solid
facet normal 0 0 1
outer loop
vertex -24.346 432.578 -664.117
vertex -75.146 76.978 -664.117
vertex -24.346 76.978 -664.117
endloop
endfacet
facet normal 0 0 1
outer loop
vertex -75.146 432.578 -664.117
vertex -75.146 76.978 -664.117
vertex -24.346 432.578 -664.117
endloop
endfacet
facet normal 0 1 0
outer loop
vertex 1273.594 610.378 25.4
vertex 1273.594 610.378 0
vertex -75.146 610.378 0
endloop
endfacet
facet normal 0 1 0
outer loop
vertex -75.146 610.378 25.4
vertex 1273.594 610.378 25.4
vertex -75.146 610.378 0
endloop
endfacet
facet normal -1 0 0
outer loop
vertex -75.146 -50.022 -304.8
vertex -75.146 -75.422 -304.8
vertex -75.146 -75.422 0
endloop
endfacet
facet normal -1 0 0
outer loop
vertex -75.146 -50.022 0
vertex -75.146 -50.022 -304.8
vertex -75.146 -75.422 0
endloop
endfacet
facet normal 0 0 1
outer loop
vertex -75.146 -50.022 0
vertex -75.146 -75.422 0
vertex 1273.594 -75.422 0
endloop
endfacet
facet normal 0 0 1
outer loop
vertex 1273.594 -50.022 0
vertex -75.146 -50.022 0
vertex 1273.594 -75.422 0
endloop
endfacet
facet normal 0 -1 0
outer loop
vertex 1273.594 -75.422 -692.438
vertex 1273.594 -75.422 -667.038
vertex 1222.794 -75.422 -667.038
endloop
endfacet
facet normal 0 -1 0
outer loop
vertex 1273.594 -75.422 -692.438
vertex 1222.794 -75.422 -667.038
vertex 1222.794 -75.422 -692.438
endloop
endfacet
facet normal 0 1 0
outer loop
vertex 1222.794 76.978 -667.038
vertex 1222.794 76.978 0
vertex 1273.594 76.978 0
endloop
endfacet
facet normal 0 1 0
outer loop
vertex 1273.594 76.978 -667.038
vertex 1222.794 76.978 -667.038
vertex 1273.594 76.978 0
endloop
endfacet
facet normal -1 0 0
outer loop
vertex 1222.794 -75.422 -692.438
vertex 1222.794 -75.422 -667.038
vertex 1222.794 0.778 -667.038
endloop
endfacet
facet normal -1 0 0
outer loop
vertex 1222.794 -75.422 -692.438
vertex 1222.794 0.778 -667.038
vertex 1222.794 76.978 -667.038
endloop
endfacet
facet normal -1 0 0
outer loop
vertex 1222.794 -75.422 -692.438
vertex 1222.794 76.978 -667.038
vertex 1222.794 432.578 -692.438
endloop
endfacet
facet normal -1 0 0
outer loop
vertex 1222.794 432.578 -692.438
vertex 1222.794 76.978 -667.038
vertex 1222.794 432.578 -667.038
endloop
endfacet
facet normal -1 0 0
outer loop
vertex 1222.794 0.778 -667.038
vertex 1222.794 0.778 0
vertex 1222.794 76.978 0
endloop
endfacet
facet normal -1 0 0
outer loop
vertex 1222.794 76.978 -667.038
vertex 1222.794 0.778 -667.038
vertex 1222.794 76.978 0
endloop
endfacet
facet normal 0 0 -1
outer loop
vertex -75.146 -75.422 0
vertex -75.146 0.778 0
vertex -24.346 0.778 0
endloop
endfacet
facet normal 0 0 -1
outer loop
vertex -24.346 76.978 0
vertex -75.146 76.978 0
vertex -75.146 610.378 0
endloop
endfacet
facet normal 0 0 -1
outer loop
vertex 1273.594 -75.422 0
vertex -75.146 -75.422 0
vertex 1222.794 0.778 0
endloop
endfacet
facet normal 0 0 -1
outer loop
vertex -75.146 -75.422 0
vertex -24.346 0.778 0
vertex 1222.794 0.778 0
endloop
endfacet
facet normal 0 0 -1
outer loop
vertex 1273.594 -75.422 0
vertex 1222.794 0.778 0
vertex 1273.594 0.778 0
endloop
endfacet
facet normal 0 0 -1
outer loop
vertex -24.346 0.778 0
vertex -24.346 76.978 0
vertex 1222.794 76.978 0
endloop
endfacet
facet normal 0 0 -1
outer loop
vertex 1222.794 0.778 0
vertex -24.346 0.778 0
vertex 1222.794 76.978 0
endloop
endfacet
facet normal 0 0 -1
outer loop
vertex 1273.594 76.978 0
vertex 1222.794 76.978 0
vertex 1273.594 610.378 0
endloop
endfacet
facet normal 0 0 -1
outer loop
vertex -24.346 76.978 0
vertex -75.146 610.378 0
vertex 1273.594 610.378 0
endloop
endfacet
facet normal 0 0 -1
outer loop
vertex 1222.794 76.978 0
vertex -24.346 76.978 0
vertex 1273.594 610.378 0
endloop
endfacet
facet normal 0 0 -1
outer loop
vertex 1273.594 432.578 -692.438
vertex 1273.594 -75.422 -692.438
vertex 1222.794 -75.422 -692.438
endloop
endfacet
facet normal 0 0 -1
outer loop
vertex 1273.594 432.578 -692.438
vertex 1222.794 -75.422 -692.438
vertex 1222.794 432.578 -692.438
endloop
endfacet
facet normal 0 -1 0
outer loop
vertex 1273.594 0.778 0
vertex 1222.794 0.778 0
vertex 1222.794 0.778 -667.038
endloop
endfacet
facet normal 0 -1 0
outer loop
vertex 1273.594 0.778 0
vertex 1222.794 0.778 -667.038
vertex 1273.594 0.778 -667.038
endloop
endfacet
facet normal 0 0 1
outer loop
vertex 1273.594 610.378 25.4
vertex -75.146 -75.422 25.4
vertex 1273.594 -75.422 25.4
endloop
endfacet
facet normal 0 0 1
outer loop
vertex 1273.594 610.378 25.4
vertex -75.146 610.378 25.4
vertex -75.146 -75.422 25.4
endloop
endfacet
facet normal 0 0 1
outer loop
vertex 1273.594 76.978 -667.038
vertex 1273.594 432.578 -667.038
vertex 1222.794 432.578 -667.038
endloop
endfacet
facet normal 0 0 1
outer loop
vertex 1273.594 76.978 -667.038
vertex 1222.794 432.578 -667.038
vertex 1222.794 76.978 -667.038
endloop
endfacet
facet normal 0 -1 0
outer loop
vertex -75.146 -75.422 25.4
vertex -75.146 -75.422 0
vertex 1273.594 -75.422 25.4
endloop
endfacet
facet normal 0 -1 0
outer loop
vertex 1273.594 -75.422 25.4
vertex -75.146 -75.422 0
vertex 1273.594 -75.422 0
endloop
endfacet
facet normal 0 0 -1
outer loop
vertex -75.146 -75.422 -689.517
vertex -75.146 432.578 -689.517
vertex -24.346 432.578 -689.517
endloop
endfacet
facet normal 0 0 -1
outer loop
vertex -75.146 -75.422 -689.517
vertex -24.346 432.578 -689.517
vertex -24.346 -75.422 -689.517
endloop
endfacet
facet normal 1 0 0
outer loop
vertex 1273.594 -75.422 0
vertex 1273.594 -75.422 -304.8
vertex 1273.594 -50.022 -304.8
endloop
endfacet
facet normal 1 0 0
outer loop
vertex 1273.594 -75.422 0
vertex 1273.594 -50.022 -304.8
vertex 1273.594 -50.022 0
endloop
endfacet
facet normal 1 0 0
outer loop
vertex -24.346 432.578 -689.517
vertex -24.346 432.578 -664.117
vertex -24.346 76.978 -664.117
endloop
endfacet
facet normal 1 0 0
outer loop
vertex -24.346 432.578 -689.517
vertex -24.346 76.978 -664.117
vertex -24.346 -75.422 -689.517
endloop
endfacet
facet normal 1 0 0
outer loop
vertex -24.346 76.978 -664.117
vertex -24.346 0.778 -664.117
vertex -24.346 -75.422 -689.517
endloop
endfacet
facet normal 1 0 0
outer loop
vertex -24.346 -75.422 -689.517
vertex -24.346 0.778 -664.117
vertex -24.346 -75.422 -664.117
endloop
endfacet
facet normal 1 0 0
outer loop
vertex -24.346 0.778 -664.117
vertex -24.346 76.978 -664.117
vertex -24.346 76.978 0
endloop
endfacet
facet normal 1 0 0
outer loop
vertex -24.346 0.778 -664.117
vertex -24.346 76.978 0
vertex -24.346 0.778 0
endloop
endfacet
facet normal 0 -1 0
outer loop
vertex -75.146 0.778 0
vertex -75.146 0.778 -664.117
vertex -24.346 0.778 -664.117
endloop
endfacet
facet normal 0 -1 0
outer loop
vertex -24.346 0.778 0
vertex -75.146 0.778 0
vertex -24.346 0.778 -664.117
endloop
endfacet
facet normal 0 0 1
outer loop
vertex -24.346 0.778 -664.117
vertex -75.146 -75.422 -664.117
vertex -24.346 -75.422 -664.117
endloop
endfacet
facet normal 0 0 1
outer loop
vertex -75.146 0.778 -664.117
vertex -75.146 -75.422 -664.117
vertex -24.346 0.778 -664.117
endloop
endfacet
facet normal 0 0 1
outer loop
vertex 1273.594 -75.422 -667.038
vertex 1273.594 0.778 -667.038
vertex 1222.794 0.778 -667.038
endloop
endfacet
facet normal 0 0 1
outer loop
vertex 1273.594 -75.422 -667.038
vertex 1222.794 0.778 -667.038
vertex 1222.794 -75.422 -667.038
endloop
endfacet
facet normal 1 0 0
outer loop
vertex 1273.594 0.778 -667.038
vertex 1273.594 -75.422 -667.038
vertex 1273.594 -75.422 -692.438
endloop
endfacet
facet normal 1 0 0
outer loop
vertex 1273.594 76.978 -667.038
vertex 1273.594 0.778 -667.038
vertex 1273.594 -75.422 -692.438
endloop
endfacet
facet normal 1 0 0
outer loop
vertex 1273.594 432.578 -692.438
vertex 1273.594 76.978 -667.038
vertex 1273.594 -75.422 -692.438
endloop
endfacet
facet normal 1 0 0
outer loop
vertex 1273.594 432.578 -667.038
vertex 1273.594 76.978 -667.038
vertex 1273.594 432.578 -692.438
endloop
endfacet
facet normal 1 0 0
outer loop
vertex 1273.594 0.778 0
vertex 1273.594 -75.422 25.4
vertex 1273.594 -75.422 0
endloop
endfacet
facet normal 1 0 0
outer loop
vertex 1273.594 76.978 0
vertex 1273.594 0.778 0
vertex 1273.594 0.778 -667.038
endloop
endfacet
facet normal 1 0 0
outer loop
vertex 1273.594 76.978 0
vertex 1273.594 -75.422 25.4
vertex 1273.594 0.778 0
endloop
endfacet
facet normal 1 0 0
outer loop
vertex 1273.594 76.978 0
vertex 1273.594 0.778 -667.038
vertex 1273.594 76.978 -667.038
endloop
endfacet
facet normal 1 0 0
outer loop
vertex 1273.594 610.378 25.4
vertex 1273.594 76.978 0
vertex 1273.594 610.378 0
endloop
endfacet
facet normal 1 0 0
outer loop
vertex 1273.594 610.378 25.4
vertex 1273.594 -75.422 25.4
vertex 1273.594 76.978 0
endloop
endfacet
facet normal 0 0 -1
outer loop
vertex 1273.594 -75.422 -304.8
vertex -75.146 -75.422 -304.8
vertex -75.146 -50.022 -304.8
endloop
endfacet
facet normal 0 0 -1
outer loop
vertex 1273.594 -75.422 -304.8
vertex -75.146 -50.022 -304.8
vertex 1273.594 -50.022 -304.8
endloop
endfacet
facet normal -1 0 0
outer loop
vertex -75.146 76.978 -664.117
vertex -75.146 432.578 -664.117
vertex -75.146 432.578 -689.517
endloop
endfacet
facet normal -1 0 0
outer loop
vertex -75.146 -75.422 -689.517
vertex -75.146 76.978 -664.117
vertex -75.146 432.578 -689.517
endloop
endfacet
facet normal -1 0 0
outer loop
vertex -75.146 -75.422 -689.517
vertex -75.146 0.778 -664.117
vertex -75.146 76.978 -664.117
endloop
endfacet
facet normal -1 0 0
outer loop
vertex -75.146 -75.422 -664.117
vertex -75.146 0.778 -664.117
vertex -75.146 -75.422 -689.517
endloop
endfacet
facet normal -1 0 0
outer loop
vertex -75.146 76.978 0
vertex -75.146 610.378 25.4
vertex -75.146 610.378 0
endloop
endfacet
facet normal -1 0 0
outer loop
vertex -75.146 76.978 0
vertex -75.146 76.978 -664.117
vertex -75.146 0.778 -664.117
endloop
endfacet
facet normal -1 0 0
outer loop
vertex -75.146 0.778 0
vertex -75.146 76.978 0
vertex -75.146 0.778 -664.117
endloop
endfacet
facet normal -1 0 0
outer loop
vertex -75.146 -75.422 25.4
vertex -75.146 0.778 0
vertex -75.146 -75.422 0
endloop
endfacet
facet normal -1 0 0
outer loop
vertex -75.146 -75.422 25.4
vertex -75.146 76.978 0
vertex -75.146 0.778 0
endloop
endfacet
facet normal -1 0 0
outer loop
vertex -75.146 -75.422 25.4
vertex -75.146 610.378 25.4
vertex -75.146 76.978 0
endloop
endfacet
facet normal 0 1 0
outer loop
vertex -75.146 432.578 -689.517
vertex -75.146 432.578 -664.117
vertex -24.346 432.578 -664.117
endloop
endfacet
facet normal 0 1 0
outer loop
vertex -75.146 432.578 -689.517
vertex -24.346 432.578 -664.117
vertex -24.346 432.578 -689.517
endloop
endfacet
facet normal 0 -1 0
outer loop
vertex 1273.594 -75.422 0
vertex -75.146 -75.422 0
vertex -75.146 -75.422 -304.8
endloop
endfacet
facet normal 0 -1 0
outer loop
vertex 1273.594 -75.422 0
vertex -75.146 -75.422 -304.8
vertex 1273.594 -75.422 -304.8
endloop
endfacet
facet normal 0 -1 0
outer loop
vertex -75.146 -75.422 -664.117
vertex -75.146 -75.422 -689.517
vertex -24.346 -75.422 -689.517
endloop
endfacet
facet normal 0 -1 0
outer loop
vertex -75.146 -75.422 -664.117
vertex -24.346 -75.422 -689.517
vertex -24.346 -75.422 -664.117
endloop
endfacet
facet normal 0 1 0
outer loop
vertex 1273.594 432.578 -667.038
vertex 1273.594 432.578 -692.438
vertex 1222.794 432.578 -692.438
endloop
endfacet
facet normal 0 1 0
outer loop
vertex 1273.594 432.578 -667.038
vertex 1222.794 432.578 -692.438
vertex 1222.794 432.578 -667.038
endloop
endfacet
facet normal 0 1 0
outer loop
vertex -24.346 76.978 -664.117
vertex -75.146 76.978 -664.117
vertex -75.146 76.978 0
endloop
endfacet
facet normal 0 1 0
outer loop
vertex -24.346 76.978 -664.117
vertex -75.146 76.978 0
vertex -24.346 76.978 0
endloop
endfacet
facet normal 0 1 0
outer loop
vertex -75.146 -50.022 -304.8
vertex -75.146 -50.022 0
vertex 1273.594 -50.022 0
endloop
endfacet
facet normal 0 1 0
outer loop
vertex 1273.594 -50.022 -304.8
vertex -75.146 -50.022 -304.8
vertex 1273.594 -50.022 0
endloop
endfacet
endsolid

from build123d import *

# Parameters (mm, degrees)
F1_DEPTH = 25.4
F2_W     = 50.8
F2_H     = 76.2
F3_DEPTH = 685.8
F5_DEPTH = 50.8
F6_W     = 76.2
F6_H     = 21.6832172394
F7_DEPTH = 50.8
F8_W     = 1348.74
F8_H     = 304.8
F9_DEPTH = 25.4


# Not quite as in the source:
# - a feature names something its author has since deleted; it is built from what else it names


with BuildPart() as f1:
    # F0 (on Top) → F1 (new body)
    with BuildSketch(Plane.XY):
        Polygon((-75.1462131739, 533.5789480239), (-75.1462131739, -75.4217356443), (1273.5937868261, -75.4217356443), (1273.5937868261, 610.3782643557), (5.8636856265, 610.3782643557), (-75.1462131739, 610.3782643557), align=None)
    extrude(amount=F1_DEPTH)

    # F2 (on face) → F3 (join)
    with BuildSketch(Plane(origin=(0, 0, 0), x_dir=(1, 0, 0), z_dir=(0, 0, -1))):
        with Locations((-49.7462131739, -38.8782643557)):
            Rectangle(F2_W, F2_H)
        with Locations((1248.1937868261, -38.8782643557)):
            Rectangle(F2_W, F2_H)
    extrude(amount=F3_DEPTH)

    # F4 (on face) → F5 (join)
    with BuildSketch(Plane.YZ.offset(1273.5937868261)):
        Polygon((0.7782643557, -667.0380438323), (-75.4217356443, -667.0380438323), (-75.4217356443, -692.4380438323), (432.5782643557, -692.4380438323), (432.5782643557, -667.0380438323), (76.9782643557, -667.0380438323), (76.9782643557, -685.8), (0.7782643557, -685.8), align=None)
    extrude(amount=-F5_DEPTH)

    # F6 (on face) → F7 (join)
    with BuildSketch(Plane(origin=(-75.1462131739, 0, 0), x_dir=(0, -1, 0), z_dir=(-1, 0, 0))):
        with Locations((-38.8782643557, -674.9583913803)):
            Rectangle(F6_W, F6_H)
        Polygon((75.4217356443, -689.5167827606), (75.4217356443, -664.1167827606), (-0.7782643557, -664.1167827606), (-0.7782643557, -685.8), (-76.9782643557, -685.8), (-76.9782643557, -664.1167827606), (-432.5782643557, -664.1167827606), (-432.5782643557, -689.5167827606), align=None)
    extrude(amount=-F7_DEPTH)


with BuildPart() as f9:
    # F8 (on face) → F9 (new body)
    with BuildSketch(Plane.XZ.offset(75.4217356443)):
        with Locations((599.2237868261, -152.4)):
            Rectangle(F8_W, F8_H)
    extrude(amount=-F9_DEPTH)


solid = Compound([f1.part, f9.part])
